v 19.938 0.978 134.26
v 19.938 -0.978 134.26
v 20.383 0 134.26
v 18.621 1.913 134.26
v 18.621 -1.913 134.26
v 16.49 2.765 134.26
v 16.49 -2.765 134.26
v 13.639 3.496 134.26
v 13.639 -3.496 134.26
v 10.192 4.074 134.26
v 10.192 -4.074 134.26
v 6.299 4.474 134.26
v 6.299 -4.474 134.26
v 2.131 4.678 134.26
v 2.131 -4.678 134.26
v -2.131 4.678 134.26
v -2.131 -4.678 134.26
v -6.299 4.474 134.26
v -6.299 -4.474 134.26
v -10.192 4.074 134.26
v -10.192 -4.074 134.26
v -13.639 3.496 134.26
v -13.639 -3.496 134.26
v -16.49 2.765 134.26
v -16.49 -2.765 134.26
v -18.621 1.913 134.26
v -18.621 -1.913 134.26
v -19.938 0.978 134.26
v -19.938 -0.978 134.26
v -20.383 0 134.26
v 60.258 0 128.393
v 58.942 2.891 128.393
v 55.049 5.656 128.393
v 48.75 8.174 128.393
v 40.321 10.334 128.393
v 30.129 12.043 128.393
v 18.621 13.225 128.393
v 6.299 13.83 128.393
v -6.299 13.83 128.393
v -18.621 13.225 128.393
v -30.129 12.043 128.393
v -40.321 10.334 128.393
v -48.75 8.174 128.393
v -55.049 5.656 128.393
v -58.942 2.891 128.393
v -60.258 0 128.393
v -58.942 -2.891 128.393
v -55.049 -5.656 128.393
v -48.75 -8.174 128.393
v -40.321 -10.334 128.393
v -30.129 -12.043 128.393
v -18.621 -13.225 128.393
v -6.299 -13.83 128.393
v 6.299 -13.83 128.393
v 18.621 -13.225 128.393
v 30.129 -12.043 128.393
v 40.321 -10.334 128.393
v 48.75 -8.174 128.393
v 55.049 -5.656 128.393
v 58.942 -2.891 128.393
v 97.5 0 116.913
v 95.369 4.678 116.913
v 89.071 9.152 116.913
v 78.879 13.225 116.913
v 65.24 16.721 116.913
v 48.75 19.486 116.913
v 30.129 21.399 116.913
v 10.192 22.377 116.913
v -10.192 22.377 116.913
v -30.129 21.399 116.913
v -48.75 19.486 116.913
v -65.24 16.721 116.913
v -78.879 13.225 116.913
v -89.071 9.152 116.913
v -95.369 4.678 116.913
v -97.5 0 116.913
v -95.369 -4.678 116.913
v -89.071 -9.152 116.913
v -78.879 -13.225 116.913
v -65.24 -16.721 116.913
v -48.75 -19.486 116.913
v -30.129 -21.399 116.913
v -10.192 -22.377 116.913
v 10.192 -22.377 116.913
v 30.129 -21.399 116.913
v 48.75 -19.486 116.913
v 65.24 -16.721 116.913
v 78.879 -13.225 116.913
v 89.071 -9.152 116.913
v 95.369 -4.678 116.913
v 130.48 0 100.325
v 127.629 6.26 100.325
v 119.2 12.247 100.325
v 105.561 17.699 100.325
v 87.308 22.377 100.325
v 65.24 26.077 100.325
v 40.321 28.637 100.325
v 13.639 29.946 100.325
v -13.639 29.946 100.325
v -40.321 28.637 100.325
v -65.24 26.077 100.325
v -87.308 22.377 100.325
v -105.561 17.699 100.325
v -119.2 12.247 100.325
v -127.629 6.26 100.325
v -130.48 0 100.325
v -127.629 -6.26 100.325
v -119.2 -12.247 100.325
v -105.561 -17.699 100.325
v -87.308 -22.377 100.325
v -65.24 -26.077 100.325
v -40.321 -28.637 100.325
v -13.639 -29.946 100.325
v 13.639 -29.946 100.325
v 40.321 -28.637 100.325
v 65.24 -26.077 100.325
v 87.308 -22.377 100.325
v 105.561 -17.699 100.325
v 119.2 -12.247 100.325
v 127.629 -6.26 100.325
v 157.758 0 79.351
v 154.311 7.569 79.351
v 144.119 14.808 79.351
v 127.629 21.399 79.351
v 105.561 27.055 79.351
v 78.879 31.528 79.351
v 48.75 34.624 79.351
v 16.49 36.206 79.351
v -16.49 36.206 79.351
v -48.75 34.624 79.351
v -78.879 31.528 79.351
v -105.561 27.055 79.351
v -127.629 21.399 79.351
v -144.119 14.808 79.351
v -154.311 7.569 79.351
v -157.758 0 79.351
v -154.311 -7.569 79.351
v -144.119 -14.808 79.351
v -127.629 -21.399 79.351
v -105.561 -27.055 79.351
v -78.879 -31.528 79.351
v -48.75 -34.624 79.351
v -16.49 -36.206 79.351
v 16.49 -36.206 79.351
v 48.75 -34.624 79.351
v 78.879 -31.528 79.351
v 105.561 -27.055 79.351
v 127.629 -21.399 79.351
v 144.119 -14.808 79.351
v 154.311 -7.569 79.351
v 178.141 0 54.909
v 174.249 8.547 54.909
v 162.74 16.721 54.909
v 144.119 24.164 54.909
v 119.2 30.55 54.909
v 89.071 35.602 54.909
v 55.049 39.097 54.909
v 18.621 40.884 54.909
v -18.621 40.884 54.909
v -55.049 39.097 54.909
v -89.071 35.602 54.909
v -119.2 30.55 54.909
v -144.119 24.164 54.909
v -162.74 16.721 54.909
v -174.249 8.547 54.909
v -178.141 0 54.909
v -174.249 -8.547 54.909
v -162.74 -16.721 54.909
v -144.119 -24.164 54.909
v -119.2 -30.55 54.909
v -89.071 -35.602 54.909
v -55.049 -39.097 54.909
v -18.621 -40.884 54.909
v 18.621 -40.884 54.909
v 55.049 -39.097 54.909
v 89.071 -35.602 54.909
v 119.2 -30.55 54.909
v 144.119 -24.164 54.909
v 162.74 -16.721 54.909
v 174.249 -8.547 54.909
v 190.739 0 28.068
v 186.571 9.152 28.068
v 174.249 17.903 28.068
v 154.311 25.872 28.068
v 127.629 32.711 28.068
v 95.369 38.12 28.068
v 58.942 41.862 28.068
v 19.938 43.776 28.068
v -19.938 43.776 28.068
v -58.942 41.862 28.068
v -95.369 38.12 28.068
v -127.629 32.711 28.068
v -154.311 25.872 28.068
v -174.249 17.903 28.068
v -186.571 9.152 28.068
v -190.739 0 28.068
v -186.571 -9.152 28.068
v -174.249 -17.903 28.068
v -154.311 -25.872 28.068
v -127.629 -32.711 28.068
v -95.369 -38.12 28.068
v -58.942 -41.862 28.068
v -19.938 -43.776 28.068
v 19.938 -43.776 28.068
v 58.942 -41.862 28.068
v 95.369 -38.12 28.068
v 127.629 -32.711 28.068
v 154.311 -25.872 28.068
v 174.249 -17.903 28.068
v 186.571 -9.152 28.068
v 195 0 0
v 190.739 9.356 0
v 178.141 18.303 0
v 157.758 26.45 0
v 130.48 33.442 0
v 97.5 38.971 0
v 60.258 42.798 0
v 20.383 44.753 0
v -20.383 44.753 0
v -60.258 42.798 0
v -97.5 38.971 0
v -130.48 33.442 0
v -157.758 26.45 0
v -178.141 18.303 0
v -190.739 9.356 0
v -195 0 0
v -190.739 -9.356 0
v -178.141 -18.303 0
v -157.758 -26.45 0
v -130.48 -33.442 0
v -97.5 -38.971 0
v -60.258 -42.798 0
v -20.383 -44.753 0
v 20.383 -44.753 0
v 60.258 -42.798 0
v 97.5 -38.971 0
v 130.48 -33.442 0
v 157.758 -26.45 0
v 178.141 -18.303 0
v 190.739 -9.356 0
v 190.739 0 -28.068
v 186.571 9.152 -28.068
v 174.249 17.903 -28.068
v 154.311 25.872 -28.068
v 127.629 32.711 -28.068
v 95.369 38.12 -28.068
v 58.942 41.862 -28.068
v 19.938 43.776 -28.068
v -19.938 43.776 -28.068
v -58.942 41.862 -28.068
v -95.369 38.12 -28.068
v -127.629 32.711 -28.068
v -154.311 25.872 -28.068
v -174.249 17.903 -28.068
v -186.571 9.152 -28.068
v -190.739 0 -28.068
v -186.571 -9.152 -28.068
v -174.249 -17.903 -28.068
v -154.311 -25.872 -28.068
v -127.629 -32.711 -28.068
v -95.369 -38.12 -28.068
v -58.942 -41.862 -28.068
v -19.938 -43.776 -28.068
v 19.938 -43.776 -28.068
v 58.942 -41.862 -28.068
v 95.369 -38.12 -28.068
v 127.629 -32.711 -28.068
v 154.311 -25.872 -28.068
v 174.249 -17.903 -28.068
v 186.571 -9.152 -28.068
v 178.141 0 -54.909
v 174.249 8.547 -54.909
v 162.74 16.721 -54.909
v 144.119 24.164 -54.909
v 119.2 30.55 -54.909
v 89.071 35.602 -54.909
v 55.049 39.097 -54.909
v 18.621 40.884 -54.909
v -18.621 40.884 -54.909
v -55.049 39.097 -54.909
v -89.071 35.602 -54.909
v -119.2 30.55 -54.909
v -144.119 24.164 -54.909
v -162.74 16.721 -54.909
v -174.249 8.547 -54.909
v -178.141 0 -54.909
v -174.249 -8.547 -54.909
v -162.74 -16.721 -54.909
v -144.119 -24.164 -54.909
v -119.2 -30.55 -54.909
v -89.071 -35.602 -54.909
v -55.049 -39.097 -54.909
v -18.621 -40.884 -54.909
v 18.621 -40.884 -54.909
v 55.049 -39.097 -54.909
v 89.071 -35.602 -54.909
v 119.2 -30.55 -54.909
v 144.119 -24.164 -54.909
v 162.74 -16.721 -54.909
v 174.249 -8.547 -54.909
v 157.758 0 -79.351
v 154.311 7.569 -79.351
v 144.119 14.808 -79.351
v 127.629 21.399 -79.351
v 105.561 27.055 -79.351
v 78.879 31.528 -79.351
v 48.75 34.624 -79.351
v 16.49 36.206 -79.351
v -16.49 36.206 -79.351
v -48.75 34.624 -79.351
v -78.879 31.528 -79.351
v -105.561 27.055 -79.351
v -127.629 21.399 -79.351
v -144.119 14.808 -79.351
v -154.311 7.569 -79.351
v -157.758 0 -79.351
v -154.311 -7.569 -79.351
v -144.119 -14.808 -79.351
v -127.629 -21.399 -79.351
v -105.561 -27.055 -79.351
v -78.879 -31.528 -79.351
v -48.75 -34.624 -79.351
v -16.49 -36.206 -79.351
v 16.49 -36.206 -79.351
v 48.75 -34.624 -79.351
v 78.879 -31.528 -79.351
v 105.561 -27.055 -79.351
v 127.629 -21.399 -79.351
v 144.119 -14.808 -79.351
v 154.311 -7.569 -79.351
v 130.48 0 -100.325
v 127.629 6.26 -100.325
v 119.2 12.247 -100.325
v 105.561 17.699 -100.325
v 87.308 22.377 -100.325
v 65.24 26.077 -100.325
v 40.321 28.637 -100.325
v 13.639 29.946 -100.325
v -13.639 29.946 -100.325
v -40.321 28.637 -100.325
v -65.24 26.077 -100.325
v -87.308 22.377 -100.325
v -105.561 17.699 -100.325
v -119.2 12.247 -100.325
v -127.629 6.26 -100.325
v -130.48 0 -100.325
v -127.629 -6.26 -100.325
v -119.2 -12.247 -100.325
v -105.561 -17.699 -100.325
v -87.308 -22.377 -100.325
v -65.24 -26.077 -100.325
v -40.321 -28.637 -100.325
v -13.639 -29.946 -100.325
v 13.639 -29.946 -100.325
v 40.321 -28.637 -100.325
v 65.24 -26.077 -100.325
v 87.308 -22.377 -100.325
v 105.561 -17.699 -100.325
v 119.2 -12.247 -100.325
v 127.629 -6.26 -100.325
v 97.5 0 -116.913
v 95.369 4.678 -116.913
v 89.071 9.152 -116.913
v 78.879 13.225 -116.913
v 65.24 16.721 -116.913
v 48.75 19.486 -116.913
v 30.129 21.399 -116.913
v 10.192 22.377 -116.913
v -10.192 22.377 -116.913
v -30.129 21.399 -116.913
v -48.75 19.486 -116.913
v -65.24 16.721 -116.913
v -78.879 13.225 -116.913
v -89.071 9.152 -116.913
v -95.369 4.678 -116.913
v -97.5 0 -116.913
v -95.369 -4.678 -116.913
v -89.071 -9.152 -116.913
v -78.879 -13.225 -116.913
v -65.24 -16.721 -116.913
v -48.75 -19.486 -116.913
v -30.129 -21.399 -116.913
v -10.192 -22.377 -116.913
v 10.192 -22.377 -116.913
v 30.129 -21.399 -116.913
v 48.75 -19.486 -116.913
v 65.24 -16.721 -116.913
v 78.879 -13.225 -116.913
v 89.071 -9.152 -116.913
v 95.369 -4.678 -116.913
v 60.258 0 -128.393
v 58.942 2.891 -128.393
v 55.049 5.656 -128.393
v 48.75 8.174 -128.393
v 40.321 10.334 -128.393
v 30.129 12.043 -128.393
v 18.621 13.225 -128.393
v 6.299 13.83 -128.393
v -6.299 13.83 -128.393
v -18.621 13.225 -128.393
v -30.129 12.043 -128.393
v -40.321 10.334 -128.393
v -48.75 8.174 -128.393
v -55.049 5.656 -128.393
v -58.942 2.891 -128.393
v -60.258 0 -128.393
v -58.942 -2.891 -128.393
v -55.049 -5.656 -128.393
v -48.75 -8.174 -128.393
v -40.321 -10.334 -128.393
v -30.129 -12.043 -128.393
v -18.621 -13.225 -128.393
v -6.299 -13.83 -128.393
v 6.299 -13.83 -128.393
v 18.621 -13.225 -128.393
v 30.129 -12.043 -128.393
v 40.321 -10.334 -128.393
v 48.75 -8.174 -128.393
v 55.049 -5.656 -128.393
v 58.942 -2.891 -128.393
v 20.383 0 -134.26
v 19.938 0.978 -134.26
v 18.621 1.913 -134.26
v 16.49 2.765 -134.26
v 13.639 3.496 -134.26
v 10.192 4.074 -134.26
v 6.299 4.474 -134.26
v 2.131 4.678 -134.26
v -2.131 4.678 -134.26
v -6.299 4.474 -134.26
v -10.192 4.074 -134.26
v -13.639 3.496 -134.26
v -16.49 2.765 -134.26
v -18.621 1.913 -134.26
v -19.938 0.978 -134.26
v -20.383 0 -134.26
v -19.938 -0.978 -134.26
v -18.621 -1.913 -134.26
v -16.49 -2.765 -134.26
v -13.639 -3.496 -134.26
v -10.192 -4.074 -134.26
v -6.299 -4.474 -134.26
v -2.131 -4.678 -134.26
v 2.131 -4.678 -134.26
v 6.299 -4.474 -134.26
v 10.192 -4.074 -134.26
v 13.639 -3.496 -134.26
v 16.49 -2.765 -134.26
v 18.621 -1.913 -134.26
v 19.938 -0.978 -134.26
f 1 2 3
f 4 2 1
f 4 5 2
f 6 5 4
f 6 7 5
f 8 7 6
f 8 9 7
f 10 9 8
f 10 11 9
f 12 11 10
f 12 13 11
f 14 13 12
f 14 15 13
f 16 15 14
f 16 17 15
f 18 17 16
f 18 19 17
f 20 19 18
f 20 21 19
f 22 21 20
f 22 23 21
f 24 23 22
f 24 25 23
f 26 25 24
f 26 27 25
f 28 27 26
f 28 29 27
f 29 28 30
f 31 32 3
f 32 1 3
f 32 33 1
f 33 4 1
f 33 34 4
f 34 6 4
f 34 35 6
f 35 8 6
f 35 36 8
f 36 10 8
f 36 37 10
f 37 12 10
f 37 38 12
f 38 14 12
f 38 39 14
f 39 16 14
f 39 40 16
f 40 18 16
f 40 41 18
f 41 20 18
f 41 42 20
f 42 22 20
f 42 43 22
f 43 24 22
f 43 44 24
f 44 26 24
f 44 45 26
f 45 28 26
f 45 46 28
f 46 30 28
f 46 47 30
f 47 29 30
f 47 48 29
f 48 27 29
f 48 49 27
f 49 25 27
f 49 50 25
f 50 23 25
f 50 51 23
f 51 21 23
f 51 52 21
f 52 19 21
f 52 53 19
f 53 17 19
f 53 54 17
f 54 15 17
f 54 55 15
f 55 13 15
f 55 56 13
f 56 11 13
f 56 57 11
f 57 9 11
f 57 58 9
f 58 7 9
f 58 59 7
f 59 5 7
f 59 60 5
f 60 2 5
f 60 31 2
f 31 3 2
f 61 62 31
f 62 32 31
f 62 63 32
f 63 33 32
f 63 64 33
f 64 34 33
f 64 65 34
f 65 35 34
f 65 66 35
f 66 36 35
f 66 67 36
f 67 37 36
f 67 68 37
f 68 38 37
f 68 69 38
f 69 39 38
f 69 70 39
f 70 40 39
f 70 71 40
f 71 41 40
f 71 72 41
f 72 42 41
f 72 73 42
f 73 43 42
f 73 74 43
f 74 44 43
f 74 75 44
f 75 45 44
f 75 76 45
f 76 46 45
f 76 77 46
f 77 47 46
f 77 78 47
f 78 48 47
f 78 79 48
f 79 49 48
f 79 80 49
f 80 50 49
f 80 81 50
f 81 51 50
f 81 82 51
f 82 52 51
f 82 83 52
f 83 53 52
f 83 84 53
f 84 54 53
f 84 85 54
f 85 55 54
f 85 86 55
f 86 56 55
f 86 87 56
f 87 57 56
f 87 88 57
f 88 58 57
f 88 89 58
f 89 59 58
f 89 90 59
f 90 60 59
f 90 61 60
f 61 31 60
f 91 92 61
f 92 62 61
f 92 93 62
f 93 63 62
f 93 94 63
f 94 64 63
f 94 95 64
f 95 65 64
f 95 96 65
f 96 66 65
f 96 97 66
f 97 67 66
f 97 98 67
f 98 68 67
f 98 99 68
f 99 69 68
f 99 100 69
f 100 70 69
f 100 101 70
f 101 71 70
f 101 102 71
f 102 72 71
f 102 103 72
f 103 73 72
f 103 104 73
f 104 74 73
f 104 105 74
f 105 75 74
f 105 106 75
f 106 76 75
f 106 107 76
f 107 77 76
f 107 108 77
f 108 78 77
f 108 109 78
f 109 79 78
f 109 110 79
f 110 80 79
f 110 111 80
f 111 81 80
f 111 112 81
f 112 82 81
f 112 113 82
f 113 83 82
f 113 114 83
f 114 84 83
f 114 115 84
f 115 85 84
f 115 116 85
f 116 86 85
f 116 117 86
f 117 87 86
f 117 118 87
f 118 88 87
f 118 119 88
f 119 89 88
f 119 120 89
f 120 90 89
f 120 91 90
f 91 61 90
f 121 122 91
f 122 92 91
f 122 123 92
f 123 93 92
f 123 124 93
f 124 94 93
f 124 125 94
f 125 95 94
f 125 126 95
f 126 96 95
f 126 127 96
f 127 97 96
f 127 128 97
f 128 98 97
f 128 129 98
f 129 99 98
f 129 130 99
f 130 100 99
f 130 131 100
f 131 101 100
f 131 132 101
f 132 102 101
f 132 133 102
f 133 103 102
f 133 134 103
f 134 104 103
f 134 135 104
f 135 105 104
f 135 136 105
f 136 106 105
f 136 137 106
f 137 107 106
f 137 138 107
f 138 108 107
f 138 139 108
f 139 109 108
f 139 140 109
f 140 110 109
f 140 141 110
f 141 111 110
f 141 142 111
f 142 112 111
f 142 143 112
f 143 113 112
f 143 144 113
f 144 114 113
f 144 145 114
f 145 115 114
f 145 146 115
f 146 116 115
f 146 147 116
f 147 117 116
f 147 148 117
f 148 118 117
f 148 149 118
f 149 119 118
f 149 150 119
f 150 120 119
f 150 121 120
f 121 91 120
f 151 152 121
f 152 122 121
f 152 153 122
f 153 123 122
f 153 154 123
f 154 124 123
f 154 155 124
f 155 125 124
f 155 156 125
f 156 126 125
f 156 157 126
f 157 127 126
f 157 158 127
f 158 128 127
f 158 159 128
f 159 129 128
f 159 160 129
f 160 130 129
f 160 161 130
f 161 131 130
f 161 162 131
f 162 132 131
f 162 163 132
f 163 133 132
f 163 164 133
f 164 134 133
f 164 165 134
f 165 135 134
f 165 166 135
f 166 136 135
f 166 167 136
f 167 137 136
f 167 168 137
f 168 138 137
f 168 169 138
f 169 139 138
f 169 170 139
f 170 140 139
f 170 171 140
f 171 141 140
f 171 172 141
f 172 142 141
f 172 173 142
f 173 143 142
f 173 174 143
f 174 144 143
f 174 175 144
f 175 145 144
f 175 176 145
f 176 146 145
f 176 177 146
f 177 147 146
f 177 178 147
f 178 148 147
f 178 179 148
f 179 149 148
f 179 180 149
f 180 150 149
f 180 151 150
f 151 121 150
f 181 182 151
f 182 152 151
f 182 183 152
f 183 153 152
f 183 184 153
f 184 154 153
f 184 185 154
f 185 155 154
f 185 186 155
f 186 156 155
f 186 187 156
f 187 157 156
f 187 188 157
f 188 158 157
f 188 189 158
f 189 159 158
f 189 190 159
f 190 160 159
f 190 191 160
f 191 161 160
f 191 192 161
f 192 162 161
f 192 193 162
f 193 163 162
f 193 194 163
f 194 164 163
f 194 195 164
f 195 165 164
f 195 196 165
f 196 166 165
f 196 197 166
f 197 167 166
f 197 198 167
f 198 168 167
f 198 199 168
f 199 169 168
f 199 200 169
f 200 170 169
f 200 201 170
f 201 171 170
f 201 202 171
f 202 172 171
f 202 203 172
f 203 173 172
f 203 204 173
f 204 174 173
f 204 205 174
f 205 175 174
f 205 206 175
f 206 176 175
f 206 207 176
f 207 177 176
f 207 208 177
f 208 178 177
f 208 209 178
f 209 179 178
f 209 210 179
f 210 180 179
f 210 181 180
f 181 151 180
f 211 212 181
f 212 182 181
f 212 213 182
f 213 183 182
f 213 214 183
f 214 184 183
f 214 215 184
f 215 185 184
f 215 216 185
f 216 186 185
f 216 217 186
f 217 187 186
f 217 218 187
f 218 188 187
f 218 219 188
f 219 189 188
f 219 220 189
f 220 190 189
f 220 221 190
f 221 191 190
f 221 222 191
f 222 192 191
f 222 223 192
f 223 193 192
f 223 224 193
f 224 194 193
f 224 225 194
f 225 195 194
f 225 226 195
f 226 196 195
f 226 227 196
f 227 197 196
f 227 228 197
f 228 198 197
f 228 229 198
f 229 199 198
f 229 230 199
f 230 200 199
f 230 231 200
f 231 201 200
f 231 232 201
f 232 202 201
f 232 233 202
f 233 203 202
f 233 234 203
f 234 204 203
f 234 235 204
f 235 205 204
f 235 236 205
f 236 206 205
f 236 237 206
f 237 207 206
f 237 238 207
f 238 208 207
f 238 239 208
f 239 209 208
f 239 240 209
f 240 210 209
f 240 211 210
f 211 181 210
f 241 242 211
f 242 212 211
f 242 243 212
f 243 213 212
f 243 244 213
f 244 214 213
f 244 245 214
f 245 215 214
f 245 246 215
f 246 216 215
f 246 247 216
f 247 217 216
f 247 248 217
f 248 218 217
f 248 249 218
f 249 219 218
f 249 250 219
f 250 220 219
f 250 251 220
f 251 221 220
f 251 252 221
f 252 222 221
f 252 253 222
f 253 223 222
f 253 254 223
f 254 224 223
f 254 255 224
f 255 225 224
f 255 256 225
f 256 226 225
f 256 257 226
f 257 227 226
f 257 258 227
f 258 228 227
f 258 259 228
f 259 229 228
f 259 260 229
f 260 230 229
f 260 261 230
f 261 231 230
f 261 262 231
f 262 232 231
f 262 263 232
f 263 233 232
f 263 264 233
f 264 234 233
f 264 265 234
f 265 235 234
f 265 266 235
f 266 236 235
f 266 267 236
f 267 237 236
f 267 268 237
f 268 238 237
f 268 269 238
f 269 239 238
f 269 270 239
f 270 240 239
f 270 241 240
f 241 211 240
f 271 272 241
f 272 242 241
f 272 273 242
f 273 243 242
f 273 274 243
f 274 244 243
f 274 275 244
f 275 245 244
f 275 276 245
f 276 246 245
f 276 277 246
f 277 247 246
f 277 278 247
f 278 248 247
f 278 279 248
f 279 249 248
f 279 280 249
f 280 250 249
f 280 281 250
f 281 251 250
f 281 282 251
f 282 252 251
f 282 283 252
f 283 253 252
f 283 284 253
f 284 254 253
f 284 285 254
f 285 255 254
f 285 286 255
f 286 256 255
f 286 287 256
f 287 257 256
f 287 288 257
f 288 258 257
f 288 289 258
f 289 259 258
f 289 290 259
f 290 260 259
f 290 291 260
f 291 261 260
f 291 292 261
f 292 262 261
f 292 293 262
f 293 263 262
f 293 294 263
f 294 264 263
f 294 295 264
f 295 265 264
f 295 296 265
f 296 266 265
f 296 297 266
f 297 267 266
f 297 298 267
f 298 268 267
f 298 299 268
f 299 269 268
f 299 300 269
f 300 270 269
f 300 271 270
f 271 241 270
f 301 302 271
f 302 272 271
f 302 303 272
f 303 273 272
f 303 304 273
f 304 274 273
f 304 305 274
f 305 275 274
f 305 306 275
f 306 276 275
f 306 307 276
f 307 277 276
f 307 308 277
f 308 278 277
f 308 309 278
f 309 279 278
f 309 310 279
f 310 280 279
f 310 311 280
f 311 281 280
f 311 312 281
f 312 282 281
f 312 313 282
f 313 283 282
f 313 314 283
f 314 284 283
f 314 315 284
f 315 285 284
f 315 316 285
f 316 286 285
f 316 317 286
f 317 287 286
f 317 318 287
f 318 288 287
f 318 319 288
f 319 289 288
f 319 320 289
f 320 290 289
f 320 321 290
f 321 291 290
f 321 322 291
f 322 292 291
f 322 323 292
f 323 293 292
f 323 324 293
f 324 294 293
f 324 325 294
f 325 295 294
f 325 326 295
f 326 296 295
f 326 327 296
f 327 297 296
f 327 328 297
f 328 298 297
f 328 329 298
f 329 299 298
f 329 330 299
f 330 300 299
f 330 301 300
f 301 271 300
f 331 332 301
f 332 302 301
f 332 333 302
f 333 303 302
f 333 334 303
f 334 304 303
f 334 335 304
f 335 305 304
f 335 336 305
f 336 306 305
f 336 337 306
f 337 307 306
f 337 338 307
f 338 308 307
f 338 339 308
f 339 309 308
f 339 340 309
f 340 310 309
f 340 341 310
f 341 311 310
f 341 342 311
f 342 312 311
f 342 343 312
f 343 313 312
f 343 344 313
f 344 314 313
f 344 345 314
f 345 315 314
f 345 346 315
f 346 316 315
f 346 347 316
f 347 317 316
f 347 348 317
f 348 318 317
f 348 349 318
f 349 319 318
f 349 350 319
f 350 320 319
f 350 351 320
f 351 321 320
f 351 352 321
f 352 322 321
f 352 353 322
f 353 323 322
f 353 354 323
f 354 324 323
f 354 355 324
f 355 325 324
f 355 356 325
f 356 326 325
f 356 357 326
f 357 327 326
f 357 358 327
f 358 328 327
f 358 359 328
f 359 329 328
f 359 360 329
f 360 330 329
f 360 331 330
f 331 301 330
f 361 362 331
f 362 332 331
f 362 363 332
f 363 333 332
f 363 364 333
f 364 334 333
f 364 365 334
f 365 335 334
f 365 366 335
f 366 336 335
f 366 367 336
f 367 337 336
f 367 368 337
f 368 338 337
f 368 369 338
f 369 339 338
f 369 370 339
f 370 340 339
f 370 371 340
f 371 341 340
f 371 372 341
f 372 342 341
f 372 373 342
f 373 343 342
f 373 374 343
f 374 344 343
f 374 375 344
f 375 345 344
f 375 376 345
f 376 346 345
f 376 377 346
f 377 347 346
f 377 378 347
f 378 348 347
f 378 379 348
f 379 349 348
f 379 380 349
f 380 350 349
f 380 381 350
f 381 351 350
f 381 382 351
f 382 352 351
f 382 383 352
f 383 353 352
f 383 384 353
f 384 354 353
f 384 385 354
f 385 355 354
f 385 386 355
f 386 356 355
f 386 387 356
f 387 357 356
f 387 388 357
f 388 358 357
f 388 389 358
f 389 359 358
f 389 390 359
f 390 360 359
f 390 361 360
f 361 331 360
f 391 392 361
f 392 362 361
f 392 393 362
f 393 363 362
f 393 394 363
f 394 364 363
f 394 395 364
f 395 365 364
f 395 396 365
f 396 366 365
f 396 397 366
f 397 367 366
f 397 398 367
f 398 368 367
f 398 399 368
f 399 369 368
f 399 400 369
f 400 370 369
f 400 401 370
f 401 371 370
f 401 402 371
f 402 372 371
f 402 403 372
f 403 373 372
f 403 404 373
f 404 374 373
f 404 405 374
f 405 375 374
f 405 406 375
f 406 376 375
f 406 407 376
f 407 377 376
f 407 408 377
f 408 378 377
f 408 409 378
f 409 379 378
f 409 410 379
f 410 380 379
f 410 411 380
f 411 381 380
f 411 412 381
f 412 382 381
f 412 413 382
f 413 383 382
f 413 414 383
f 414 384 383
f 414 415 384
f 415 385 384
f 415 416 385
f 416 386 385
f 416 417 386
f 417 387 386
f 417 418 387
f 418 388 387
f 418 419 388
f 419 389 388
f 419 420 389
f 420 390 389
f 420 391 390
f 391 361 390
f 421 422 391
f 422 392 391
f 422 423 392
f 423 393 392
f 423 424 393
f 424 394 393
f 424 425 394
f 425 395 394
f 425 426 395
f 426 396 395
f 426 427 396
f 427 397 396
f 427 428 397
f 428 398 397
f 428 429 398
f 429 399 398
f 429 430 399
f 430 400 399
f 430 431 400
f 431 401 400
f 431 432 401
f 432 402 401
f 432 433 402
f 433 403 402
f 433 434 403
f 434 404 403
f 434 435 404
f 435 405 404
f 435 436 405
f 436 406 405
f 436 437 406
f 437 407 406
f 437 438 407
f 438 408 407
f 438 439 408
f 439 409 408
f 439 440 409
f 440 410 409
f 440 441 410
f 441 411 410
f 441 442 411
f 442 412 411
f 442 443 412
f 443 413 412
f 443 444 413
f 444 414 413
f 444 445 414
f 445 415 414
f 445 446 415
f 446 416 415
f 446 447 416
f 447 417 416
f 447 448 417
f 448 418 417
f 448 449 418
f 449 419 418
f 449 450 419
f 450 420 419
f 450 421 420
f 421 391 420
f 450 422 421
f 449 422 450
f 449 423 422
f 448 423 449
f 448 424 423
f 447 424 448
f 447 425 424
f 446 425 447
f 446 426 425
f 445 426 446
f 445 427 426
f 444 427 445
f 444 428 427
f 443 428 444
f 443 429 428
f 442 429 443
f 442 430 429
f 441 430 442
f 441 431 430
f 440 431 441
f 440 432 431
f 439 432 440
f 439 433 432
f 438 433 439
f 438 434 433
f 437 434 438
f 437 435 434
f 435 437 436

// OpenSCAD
// Generated by SolidPython 1.0.1 on 2020-07-29 00:46:50


scale(v = [13, 3, 9]) {
	sphere(r = 15);
}
/***********************************************
*********      SolidPython code:      **********
************************************************
 
# import packages: SolidPython
from solid import *
from solid.utils import *
from itertools import chain, combinations, permutations


class Resize:

    def __init__(self, scad_file):
        self.scad_file = scad_file
        #self.scad_file = import_scad(scad_file)
        # cone/cylinder param:
        self.r1 = 0
        self.r2 = 0
        self.h = 0
        # rectangular prism param:
        self.w = 0
        self.l = 0
        # ellipse param:
        self.r = 0

    # import OpenScad code (file name corresponds to shape)


    # classify shape + parameters
    def assign(self, param1, param2, param3):
        if self.scad_file == 'cone.scad':
            self.r1 = param1
            self.r2 = param2
            self.h = param3
        elif self.scad_file == 'cylinder.scad':
            self.r1 = param1
            self.r2 = param2
            self.h = param3
        elif self.scad_file == 'rectangularPrism.scad':
            self.h = param1
            self.l = param2
            self.w = param3
        else:
            self.r = param1
            self.h = param2

    # resize parameters
    def iterate(self):
        x = range(3, 20, 2)
        i = 1
        if self.scad_file == 'cone.scad':
            tempList = list(permutations(x, 2))
            for temp in tempList:
                param1 = temp[0]
                param2 = temp[1]
                filepath = 'produced_scad_files/' + 'cone' + str(param1) + '_' + str(param2) + '_' + '.scad'
                scad_render_to_file(cylinder(h=param1, r1=param2, r2=0), filepath)

        elif self.scad_file == 'cylinder.scad':
            tempList = list(permutations(x, 3))
            for temp in tempList:
                param1 = temp[0]
                param2 = temp[1]
                filepath = 'produced_scad_files/' + 'cylinder' + str(param1) + '_' + str(param2) + '_' + '.scad'
                scad_render_to_file(cylinder(h=param1, r1=param2, r2=param2), filepath)

        elif self.scad_file == 'rectangularPrism.scad':
            tempList = list(permutations(x, 3))
            for temp in tempList:
                param1 = temp[0]
                param2 = temp[1]
                param3 = temp[2]
                filepath = 'produced_scad_files/' + 'rectangularPrism' + str(param1) + '_' + str(param2) + '_' + str(
                    param3) + '.scad'
                scad_render_to_file(cube(size=(param1, param2, param3)), filepath)

        elif self.scad_file == 'ellipse.scad':
            tempList = list(permutations(x, 4))
            for temp in tempList:
                param1 = temp[0]
                param2 = temp[1]
                param3 = temp[2]
                param4 = temp[3]
                filepath = 'produced_scad_files/' + 'ellipse' + str(param1) + '_' + str(param2) + '_' + str(param3) + '_' + str(param4) + '.scad'
                scad_render_to_file(scale([param1, param2, param3])(sphere(r=param4)), filepath)

    def render_to_scadfile(self):
        scad_render_to_file(scad, 'example.scad') 
 
************************************************/
